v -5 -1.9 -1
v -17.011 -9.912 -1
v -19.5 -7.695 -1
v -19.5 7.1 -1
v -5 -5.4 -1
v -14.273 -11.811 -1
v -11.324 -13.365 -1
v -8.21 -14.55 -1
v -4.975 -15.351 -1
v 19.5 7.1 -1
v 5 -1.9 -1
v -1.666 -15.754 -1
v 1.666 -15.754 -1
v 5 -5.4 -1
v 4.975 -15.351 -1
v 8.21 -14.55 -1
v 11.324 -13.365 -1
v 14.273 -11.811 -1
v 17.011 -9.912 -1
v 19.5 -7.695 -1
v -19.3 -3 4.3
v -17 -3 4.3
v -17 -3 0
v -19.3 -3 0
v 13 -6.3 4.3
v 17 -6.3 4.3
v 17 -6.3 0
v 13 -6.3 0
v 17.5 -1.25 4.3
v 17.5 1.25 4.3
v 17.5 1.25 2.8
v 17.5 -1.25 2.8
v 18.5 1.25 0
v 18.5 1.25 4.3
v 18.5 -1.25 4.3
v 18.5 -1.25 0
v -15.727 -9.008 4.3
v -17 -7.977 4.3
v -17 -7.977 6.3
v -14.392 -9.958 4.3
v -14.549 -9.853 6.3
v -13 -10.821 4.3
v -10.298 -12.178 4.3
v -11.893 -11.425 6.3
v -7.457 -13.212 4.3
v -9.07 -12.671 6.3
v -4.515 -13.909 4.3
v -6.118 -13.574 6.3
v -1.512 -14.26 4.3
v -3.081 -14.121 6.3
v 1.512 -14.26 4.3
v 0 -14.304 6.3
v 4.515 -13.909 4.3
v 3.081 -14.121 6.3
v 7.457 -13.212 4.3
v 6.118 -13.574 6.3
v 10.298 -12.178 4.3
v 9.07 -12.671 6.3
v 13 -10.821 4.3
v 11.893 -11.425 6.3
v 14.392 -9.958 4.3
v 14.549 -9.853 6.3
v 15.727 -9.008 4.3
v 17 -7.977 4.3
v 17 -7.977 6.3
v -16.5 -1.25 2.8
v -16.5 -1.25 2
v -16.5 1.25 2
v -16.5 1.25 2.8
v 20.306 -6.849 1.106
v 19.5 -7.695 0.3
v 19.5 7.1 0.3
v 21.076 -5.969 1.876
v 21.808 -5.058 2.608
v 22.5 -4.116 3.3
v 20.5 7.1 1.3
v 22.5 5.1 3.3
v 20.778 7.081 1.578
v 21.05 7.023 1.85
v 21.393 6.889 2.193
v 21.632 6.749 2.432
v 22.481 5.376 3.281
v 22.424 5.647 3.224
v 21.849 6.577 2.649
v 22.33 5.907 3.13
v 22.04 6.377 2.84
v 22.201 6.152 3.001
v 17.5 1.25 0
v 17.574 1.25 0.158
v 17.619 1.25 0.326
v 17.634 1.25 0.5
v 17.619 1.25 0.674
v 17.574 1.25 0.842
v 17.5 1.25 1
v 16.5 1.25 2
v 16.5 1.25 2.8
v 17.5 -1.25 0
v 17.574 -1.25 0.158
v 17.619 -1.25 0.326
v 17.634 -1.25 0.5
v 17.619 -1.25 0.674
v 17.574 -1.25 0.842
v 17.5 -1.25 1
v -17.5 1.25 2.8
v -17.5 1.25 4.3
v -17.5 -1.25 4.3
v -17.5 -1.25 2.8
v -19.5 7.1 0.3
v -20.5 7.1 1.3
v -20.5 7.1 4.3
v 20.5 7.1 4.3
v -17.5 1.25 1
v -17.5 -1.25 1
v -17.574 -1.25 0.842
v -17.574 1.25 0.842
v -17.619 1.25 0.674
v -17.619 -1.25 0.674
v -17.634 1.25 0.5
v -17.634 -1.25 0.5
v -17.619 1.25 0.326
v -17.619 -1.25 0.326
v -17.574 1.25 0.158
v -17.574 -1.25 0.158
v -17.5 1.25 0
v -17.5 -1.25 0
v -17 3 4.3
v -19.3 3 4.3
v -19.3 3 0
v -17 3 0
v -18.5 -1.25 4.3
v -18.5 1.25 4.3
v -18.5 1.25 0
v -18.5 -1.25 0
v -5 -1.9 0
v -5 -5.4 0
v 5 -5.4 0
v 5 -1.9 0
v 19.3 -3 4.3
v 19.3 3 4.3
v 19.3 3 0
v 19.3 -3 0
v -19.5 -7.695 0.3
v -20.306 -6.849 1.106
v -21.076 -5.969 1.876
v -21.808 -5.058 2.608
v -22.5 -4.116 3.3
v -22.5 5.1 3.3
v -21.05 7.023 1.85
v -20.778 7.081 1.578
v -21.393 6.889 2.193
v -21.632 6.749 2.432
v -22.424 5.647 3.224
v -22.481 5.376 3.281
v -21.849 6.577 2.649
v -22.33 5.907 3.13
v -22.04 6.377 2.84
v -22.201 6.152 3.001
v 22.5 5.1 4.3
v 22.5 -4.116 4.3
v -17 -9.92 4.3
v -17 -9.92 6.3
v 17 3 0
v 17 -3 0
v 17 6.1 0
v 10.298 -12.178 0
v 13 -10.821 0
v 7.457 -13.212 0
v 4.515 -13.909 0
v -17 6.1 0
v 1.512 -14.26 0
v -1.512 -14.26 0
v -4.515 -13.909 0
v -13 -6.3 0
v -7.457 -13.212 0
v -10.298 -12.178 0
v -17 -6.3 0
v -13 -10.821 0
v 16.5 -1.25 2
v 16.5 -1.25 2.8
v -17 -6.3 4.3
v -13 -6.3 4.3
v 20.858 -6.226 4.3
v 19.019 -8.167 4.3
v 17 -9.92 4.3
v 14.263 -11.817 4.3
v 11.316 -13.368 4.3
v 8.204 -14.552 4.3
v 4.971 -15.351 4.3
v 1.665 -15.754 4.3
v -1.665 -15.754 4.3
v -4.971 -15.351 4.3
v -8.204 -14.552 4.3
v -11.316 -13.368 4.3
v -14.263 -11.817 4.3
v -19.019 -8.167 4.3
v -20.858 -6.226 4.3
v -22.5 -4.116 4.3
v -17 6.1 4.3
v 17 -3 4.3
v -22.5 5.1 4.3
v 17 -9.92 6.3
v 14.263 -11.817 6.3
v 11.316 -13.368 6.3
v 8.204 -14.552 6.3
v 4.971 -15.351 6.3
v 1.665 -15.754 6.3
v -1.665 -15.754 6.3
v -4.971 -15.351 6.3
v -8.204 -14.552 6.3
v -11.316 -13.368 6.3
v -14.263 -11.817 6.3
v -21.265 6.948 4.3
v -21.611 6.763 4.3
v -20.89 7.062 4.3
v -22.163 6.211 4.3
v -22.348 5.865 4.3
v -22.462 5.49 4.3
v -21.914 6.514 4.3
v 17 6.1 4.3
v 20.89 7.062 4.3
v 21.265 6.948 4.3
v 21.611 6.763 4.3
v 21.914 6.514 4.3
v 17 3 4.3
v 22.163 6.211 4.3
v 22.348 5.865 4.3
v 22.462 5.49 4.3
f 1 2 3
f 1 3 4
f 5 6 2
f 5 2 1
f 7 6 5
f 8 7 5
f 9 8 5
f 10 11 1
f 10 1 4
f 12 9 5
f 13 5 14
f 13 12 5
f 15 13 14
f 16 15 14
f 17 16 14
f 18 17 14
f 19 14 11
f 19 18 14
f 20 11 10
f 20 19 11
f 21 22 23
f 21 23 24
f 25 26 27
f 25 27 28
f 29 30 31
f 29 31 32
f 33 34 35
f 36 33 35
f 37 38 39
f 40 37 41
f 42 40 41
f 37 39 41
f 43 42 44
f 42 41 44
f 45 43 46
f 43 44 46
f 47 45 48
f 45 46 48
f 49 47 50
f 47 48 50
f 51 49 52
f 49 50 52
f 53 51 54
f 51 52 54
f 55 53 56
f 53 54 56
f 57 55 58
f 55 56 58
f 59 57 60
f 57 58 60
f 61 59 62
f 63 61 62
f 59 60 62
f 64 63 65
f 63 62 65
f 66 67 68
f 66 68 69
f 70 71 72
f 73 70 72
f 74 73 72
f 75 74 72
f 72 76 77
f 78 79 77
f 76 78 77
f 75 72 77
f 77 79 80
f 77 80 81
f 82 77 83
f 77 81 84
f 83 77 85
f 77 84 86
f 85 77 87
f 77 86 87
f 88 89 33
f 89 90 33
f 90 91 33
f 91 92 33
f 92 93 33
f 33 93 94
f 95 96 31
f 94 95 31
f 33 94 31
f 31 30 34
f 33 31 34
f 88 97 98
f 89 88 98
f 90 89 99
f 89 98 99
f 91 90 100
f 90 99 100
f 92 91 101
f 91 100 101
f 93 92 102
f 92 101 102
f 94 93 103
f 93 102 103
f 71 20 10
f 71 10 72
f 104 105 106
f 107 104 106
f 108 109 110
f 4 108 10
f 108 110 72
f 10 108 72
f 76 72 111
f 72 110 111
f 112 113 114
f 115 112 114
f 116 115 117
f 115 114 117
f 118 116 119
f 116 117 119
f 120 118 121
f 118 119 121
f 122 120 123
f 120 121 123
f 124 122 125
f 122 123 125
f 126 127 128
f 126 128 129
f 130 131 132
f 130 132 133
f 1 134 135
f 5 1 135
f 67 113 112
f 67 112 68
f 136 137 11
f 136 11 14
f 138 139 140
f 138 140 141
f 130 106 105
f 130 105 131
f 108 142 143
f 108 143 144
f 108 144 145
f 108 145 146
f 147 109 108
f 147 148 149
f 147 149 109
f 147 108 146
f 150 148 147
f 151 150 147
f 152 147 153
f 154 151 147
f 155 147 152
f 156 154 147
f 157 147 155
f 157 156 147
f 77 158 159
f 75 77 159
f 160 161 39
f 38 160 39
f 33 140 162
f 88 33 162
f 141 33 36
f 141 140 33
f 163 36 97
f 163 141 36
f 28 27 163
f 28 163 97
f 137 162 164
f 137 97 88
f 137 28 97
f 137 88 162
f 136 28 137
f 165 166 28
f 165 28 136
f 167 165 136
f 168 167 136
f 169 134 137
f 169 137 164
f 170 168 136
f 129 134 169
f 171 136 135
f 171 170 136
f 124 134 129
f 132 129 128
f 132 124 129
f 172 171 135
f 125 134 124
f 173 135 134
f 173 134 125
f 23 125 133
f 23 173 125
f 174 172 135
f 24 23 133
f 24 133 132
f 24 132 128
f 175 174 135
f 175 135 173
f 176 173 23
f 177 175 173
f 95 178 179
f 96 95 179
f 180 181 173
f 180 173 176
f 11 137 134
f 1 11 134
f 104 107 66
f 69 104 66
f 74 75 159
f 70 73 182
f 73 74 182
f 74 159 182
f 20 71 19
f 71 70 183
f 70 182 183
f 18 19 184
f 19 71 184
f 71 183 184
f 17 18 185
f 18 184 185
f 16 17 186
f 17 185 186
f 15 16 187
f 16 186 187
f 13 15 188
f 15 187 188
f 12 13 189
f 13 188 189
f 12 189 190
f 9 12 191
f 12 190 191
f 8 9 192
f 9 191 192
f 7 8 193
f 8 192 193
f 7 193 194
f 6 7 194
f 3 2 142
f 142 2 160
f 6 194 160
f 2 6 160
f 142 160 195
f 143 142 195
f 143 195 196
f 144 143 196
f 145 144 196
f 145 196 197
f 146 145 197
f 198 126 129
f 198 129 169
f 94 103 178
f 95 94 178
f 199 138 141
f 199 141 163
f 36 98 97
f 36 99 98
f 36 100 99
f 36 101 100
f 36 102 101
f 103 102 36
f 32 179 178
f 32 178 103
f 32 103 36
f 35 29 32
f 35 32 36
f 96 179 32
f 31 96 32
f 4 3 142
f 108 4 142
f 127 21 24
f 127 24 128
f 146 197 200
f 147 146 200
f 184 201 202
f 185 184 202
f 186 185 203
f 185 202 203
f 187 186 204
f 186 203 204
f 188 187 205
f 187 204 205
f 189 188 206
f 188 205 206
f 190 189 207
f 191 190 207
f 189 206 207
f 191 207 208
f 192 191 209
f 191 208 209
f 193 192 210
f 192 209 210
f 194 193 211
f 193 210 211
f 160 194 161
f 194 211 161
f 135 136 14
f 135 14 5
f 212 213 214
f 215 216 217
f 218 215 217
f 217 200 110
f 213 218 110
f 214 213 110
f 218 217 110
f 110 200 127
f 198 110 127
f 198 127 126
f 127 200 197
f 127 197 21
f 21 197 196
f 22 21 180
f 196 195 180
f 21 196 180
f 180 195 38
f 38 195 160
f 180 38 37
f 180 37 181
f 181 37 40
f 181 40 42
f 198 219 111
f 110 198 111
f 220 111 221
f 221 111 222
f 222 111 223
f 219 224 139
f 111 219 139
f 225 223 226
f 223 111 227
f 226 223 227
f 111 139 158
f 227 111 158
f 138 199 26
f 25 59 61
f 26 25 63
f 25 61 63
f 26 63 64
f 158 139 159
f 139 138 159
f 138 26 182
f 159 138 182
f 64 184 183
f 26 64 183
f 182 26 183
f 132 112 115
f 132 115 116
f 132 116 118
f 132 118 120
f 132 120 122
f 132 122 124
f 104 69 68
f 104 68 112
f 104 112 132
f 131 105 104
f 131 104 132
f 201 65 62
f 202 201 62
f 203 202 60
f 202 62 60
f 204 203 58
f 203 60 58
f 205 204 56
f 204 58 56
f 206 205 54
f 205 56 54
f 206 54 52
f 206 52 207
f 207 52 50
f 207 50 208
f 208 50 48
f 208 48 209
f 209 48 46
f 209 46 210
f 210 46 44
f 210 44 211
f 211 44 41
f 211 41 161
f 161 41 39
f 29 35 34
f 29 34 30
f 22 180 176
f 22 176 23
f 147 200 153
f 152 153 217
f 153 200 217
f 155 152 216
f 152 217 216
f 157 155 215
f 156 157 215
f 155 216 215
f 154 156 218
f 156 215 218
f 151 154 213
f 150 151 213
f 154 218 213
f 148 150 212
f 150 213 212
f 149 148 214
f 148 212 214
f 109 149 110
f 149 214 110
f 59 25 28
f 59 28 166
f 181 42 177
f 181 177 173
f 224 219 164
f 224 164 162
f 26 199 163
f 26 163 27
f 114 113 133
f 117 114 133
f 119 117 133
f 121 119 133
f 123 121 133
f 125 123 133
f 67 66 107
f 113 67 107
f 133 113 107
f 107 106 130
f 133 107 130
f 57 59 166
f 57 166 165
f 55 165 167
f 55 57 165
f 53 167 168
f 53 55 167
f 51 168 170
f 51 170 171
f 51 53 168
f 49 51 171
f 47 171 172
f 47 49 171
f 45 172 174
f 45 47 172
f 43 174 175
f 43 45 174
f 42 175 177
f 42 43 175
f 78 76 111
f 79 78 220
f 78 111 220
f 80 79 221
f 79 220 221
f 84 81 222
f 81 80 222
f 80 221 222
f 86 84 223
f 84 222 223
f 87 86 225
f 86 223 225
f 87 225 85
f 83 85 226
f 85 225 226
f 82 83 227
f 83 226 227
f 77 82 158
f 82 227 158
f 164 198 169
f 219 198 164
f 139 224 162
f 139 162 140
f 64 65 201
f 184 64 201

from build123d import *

# Parameters (mm, degrees)
SKETCH1_W           = 1
SKETCH1_H           = 2.5
SKETCH1_W_2         = 10
SKETCH1_H_2         = 3.5
BOSS_EXTRUDE1_DEPTH = 1
BOSS_EXTRUDE2_START = 4.3
SKETCH1_3_W         = 1
SKETCH1_3_H         = 2.5
BOSS_EXTRUDE2_DEPTH = 4.3
CUT_EXTRUDE1_REACH  = 29.14
CUT_EXTRUDE2_DEPTH  = 33.393667716
BOSS_EXTRUDE4_START = 2
BOSS_EXTRUDE4_DEPTH = 2
SKETCH3_5_W         = 1
SKETCH3_5_H         = 0.8
BOSS_EXTRUDE5_DEPTH = 2.5


with BuildPart() as part:
    # Sketch1 → Boss-Extrude1 (new body)
    # profile 1 of 4: a face of its own
    with BuildSketch(Plane(origin=(0, 0, 0), x_dir=(-1, 0, 0), z_dir=(0, 0, 1))):
        with BuildLine():
            ThreePointArc((-20.5, -7.1), (-21.914213562, -6.514213562), (-22.5, -5.1))
            Line((-22.5, -5.1), (-22.5, 4.115748324))
            ThreePointArc((-22.5, 4.115748324), (0, 15.804360023), (22.5, 4.115748324))
            Line((22.5, 4.115748324), (22.5, -5.1))
            ThreePointArc((22.5, -5.1), (21.914213562, -6.514213562), (20.5, -7.1))
            Line((20.5, -7.1), (-20.5, -7.1))
        make_face()
        with BuildLine():
            Line((-13, 6.3), (-13, 10.821020521))
            ThreePointArc((-13, 10.821020521), (0, 14.304360023), (13, 10.821020521))
            Line((13, 10.821020521), (13, 6.3))
            Line((13, 6.3), (17, 6.3))
            Line((17, 6.3), (17, 3))
            Line((17, 3), (19.3, 3))
            Line((19.3, 3), (19.3, -3))
            Line((19.3, -3), (17, -3))
            Line((17, -3), (17, -6.1))
            Line((17, -6.1), (-17, -6.1))
            Line((-17, -6.1), (-17, -3))
            Line((-17, -3), (-19.3, -3))
            Line((-19.3, -3), (-19.3, 3))
            Line((-19.3, 3), (-17, 3))
            Line((-17, 3), (-17, 6.3))
            Line((-17, 6.3), (-13, 6.3))
        make_face(mode=Mode.SUBTRACT)
    # profile 2 of 4: a face of its own
    with BuildSketch(Plane(origin=(0, 0, 0), x_dir=(-1, 0, 0), z_dir=(0, 0, 1))):
        with BuildLine():
            ThreePointArc((-13, 10.821020521), (0, 14.304360023), (13, 10.821020521))
            Line((13, 10.821020521), (13, 6.3))
            Line((13, 6.3), (17, 6.3))
            Line((17, 6.3), (17, 3))
            Line((17, 3), (19.3, 3))
            Line((19.3, 3), (19.3, -3))
            Line((19.3, -3), (17, -3))
            Line((17, -3), (17, -6.1))
            Line((17, -6.1), (-17, -6.1))
            Line((-17, -6.1), (-17, -3))
            Line((-17, -3), (-19.3, -3))
            Line((-19.3, -3), (-19.3, 3))
            Line((-19.3, 3), (-17, 3))
            Line((-17, 3), (-17, 6.3))
            Line((-17, 6.3), (-13, 6.3))
            Line((-13, 6.3), (-13, 10.821020521))
        make_face()
        with Locations((-18, 0)):
            Rectangle(SKETCH1_W, SKETCH1_H, mode=Mode.SUBTRACT)
        with Locations((0, 3.65)):
            Rectangle(SKETCH1_W_2, SKETCH1_H_2, mode=Mode.SUBTRACT)
        with Locations((18, 0)):
            Rectangle(SKETCH1_W, SKETCH1_H, mode=Mode.SUBTRACT)
    # profile 3 of 4: a face of its own
    with BuildSketch(Plane(origin=(0, 0, 0), x_dir=(-1, 0, 0), z_dir=(0, 0, 1))):
        with Locations((18, 0)):
            Rectangle(SKETCH1_W, SKETCH1_H)
    # profile 4 of 4: a face of its own
    with BuildSketch(Plane(origin=(0, 0, 0), x_dir=(-1, 0, 0), z_dir=(0, 0, 1))):
        with Locations((-18, 0)):
            Rectangle(SKETCH1_W, SKETCH1_H)
    extrude(amount=-BOSS_EXTRUDE1_DEPTH)

    # Sketch1<3> → Boss-Extrude2 (add)
    # profile 1 of 3: a face of its own
    with BuildSketch(Plane(origin=(0, 0, 0), x_dir=(-1, 0, 0), z_dir=(0, 0, 1)).offset(BOSS_EXTRUDE2_START)):
        with BuildLine():
            ThreePointArc((-20.5, -7.1), (-21.914213562, -6.514213562), (-22.5, -5.1))
            Line((-22.5, -5.1), (-22.5, 4.115748324))
            ThreePointArc((-22.5, 4.115748324), (0, 15.804360023), (22.5, 4.115748324))
            Line((22.5, 4.115748324), (22.5, -5.1))
            ThreePointArc((22.5, -5.1), (21.914213562, -6.514213562), (20.5, -7.1))
            Line((20.5, -7.1), (-20.5, -7.1))
        make_face()
        with BuildLine():
            Line((-13, 6.3), (-13, 10.821020521))
            ThreePointArc((-13, 10.821020521), (0, 14.304360023), (13, 10.821020521))
            Line((13, 10.821020521), (13, 6.3))
            Line((13, 6.3), (17, 6.3))
            Line((17, 6.3), (17, 3))
            Line((17, 3), (19.3, 3))
            Line((19.3, 3), (19.3, -3))
            Line((19.3, -3), (17, -3))
            Line((17, -3), (17, -6.1))
            Line((17, -6.1), (-17, -6.1))
            Line((-17, -6.1), (-17, -3))
            Line((-17, -3), (-19.3, -3))
            Line((-19.3, -3), (-19.3, 3))
            Line((-19.3, 3), (-17, 3))
            Line((-17, 3), (-17, 6.3))
            Line((-17, 6.3), (-13, 6.3))
        make_face(mode=Mode.SUBTRACT)
    # profile 2 of 3: a face of its own
    with BuildSketch(Plane(origin=(0, 0, 0), x_dir=(-1, 0, 0), z_dir=(0, 0, 1)).offset(BOSS_EXTRUDE2_START)):
        with Locations((18, 0)):
            Rectangle(SKETCH1_3_W, SKETCH1_3_H)
    # profile 3 of 3: a face of its own
    with BuildSketch(Plane(origin=(0, 0, 0), x_dir=(-1, 0, 0), z_dir=(0, 0, 1)).offset(BOSS_EXTRUDE2_START)):
        with Locations((-18, 0)):
            Rectangle(SKETCH1_3_W, SKETCH1_3_H)
    extrude(amount=-BOSS_EXTRUDE2_DEPTH)

    # Sketch3 → Cut-Extrude1 (cut, up to next)
    with BuildSketch(Plane.XZ.offset(1.25), mode=Mode.PRIVATE) as cut_extrude1_sk1:
        with BuildLine():
            Line((-17.5, 0), (-17.5, 1))
            ThreePointArc((-17.5, 1), (-17.633974596, 0.5), (-17.5, 0))
        make_face()
    cut_extrude1_tool1 = extrude(cut_extrude1_sk1.sketch, amount=-CUT_EXTRUDE1_REACH, mode=Mode.PRIVATE) & part.part
    # Sketch3 → Cut-Extrude1 (cut, up to next)
    with BuildSketch(Plane.XZ.offset(1.25), mode=Mode.PRIVATE) as cut_extrude1_sk2:
        with BuildLine():
            ThreePointArc((17.5, 0), (17.633974596, 0.5), (17.5, 1))
            Line((17.5, 1), (17.5, 0))
        make_face()
    cut_extrude1_tool2 = extrude(cut_extrude1_sk2.sketch, amount=-CUT_EXTRUDE1_REACH, mode=Mode.PRIVATE) & part.part
    add(cut_extrude1_tool1.solids().sort_by_distance((-17.55391, -1.25, 0.5))[0], mode=Mode.SUBTRACT)
    add(cut_extrude1_tool2.solids().sort_by_distance((17.55391, -1.25, 0.5))[0], mode=Mode.SUBTRACT)

    # Sketch4 → Cut-Extrude2 (cut, through all)
    with BuildSketch(Plane(origin=(0, 7.1, 0), x_dir=(1, 0, 0), z_dir=(0, 1, 0))):
        Polygon((19.5, 1), (19.5, -0.3), (22.5, -3.3), (22.5, 1), align=None)
        Polygon((-19.5, -0.3), (-22.5, -3.3), (-22.5, 1), (-19.5, 1), align=None)
    extrude(amount=-CUT_EXTRUDE2_DEPTH, mode=Mode.SUBTRACT)

    # Sketch5 → Boss-Extrude4 (add)
    with BuildSketch(Plane.XY.offset(4.3).offset(BOSS_EXTRUDE4_START)):
        with BuildLine():
            Line((17, -7.976675596), (17, -9.920326344))
            ThreePointArc((17, -9.920326344), (0, -15.804360023), (-17, -9.920326344))
            Line((-17, -9.920326344), (-17, -7.976675596))
            ThreePointArc((-17, -7.976675596), (0, -14.304360023), (17, -7.976675596))
        make_face()
    extrude(amount=-BOSS_EXTRUDE4_DEPTH)

    # Sketch3<5> → Boss-Extrude5 (add)
    with BuildSketch(Plane.XZ.offset(1.25)):
        with Locations((17, 2.4)):
            Rectangle(SKETCH3_5_W, SKETCH3_5_H)
        Polygon((16.5, 2), (17.5, 2), (17.5, 1), align=None)
        with Locations((-17, 2.4)):
            Rectangle(SKETCH3_5_W, SKETCH3_5_H)
        Polygon((-16.5, 2), (-17.5, 2), (-17.5, 1), align=None)
    extrude(amount=-BOSS_EXTRUDE5_DEPTH)


solid = part.part
